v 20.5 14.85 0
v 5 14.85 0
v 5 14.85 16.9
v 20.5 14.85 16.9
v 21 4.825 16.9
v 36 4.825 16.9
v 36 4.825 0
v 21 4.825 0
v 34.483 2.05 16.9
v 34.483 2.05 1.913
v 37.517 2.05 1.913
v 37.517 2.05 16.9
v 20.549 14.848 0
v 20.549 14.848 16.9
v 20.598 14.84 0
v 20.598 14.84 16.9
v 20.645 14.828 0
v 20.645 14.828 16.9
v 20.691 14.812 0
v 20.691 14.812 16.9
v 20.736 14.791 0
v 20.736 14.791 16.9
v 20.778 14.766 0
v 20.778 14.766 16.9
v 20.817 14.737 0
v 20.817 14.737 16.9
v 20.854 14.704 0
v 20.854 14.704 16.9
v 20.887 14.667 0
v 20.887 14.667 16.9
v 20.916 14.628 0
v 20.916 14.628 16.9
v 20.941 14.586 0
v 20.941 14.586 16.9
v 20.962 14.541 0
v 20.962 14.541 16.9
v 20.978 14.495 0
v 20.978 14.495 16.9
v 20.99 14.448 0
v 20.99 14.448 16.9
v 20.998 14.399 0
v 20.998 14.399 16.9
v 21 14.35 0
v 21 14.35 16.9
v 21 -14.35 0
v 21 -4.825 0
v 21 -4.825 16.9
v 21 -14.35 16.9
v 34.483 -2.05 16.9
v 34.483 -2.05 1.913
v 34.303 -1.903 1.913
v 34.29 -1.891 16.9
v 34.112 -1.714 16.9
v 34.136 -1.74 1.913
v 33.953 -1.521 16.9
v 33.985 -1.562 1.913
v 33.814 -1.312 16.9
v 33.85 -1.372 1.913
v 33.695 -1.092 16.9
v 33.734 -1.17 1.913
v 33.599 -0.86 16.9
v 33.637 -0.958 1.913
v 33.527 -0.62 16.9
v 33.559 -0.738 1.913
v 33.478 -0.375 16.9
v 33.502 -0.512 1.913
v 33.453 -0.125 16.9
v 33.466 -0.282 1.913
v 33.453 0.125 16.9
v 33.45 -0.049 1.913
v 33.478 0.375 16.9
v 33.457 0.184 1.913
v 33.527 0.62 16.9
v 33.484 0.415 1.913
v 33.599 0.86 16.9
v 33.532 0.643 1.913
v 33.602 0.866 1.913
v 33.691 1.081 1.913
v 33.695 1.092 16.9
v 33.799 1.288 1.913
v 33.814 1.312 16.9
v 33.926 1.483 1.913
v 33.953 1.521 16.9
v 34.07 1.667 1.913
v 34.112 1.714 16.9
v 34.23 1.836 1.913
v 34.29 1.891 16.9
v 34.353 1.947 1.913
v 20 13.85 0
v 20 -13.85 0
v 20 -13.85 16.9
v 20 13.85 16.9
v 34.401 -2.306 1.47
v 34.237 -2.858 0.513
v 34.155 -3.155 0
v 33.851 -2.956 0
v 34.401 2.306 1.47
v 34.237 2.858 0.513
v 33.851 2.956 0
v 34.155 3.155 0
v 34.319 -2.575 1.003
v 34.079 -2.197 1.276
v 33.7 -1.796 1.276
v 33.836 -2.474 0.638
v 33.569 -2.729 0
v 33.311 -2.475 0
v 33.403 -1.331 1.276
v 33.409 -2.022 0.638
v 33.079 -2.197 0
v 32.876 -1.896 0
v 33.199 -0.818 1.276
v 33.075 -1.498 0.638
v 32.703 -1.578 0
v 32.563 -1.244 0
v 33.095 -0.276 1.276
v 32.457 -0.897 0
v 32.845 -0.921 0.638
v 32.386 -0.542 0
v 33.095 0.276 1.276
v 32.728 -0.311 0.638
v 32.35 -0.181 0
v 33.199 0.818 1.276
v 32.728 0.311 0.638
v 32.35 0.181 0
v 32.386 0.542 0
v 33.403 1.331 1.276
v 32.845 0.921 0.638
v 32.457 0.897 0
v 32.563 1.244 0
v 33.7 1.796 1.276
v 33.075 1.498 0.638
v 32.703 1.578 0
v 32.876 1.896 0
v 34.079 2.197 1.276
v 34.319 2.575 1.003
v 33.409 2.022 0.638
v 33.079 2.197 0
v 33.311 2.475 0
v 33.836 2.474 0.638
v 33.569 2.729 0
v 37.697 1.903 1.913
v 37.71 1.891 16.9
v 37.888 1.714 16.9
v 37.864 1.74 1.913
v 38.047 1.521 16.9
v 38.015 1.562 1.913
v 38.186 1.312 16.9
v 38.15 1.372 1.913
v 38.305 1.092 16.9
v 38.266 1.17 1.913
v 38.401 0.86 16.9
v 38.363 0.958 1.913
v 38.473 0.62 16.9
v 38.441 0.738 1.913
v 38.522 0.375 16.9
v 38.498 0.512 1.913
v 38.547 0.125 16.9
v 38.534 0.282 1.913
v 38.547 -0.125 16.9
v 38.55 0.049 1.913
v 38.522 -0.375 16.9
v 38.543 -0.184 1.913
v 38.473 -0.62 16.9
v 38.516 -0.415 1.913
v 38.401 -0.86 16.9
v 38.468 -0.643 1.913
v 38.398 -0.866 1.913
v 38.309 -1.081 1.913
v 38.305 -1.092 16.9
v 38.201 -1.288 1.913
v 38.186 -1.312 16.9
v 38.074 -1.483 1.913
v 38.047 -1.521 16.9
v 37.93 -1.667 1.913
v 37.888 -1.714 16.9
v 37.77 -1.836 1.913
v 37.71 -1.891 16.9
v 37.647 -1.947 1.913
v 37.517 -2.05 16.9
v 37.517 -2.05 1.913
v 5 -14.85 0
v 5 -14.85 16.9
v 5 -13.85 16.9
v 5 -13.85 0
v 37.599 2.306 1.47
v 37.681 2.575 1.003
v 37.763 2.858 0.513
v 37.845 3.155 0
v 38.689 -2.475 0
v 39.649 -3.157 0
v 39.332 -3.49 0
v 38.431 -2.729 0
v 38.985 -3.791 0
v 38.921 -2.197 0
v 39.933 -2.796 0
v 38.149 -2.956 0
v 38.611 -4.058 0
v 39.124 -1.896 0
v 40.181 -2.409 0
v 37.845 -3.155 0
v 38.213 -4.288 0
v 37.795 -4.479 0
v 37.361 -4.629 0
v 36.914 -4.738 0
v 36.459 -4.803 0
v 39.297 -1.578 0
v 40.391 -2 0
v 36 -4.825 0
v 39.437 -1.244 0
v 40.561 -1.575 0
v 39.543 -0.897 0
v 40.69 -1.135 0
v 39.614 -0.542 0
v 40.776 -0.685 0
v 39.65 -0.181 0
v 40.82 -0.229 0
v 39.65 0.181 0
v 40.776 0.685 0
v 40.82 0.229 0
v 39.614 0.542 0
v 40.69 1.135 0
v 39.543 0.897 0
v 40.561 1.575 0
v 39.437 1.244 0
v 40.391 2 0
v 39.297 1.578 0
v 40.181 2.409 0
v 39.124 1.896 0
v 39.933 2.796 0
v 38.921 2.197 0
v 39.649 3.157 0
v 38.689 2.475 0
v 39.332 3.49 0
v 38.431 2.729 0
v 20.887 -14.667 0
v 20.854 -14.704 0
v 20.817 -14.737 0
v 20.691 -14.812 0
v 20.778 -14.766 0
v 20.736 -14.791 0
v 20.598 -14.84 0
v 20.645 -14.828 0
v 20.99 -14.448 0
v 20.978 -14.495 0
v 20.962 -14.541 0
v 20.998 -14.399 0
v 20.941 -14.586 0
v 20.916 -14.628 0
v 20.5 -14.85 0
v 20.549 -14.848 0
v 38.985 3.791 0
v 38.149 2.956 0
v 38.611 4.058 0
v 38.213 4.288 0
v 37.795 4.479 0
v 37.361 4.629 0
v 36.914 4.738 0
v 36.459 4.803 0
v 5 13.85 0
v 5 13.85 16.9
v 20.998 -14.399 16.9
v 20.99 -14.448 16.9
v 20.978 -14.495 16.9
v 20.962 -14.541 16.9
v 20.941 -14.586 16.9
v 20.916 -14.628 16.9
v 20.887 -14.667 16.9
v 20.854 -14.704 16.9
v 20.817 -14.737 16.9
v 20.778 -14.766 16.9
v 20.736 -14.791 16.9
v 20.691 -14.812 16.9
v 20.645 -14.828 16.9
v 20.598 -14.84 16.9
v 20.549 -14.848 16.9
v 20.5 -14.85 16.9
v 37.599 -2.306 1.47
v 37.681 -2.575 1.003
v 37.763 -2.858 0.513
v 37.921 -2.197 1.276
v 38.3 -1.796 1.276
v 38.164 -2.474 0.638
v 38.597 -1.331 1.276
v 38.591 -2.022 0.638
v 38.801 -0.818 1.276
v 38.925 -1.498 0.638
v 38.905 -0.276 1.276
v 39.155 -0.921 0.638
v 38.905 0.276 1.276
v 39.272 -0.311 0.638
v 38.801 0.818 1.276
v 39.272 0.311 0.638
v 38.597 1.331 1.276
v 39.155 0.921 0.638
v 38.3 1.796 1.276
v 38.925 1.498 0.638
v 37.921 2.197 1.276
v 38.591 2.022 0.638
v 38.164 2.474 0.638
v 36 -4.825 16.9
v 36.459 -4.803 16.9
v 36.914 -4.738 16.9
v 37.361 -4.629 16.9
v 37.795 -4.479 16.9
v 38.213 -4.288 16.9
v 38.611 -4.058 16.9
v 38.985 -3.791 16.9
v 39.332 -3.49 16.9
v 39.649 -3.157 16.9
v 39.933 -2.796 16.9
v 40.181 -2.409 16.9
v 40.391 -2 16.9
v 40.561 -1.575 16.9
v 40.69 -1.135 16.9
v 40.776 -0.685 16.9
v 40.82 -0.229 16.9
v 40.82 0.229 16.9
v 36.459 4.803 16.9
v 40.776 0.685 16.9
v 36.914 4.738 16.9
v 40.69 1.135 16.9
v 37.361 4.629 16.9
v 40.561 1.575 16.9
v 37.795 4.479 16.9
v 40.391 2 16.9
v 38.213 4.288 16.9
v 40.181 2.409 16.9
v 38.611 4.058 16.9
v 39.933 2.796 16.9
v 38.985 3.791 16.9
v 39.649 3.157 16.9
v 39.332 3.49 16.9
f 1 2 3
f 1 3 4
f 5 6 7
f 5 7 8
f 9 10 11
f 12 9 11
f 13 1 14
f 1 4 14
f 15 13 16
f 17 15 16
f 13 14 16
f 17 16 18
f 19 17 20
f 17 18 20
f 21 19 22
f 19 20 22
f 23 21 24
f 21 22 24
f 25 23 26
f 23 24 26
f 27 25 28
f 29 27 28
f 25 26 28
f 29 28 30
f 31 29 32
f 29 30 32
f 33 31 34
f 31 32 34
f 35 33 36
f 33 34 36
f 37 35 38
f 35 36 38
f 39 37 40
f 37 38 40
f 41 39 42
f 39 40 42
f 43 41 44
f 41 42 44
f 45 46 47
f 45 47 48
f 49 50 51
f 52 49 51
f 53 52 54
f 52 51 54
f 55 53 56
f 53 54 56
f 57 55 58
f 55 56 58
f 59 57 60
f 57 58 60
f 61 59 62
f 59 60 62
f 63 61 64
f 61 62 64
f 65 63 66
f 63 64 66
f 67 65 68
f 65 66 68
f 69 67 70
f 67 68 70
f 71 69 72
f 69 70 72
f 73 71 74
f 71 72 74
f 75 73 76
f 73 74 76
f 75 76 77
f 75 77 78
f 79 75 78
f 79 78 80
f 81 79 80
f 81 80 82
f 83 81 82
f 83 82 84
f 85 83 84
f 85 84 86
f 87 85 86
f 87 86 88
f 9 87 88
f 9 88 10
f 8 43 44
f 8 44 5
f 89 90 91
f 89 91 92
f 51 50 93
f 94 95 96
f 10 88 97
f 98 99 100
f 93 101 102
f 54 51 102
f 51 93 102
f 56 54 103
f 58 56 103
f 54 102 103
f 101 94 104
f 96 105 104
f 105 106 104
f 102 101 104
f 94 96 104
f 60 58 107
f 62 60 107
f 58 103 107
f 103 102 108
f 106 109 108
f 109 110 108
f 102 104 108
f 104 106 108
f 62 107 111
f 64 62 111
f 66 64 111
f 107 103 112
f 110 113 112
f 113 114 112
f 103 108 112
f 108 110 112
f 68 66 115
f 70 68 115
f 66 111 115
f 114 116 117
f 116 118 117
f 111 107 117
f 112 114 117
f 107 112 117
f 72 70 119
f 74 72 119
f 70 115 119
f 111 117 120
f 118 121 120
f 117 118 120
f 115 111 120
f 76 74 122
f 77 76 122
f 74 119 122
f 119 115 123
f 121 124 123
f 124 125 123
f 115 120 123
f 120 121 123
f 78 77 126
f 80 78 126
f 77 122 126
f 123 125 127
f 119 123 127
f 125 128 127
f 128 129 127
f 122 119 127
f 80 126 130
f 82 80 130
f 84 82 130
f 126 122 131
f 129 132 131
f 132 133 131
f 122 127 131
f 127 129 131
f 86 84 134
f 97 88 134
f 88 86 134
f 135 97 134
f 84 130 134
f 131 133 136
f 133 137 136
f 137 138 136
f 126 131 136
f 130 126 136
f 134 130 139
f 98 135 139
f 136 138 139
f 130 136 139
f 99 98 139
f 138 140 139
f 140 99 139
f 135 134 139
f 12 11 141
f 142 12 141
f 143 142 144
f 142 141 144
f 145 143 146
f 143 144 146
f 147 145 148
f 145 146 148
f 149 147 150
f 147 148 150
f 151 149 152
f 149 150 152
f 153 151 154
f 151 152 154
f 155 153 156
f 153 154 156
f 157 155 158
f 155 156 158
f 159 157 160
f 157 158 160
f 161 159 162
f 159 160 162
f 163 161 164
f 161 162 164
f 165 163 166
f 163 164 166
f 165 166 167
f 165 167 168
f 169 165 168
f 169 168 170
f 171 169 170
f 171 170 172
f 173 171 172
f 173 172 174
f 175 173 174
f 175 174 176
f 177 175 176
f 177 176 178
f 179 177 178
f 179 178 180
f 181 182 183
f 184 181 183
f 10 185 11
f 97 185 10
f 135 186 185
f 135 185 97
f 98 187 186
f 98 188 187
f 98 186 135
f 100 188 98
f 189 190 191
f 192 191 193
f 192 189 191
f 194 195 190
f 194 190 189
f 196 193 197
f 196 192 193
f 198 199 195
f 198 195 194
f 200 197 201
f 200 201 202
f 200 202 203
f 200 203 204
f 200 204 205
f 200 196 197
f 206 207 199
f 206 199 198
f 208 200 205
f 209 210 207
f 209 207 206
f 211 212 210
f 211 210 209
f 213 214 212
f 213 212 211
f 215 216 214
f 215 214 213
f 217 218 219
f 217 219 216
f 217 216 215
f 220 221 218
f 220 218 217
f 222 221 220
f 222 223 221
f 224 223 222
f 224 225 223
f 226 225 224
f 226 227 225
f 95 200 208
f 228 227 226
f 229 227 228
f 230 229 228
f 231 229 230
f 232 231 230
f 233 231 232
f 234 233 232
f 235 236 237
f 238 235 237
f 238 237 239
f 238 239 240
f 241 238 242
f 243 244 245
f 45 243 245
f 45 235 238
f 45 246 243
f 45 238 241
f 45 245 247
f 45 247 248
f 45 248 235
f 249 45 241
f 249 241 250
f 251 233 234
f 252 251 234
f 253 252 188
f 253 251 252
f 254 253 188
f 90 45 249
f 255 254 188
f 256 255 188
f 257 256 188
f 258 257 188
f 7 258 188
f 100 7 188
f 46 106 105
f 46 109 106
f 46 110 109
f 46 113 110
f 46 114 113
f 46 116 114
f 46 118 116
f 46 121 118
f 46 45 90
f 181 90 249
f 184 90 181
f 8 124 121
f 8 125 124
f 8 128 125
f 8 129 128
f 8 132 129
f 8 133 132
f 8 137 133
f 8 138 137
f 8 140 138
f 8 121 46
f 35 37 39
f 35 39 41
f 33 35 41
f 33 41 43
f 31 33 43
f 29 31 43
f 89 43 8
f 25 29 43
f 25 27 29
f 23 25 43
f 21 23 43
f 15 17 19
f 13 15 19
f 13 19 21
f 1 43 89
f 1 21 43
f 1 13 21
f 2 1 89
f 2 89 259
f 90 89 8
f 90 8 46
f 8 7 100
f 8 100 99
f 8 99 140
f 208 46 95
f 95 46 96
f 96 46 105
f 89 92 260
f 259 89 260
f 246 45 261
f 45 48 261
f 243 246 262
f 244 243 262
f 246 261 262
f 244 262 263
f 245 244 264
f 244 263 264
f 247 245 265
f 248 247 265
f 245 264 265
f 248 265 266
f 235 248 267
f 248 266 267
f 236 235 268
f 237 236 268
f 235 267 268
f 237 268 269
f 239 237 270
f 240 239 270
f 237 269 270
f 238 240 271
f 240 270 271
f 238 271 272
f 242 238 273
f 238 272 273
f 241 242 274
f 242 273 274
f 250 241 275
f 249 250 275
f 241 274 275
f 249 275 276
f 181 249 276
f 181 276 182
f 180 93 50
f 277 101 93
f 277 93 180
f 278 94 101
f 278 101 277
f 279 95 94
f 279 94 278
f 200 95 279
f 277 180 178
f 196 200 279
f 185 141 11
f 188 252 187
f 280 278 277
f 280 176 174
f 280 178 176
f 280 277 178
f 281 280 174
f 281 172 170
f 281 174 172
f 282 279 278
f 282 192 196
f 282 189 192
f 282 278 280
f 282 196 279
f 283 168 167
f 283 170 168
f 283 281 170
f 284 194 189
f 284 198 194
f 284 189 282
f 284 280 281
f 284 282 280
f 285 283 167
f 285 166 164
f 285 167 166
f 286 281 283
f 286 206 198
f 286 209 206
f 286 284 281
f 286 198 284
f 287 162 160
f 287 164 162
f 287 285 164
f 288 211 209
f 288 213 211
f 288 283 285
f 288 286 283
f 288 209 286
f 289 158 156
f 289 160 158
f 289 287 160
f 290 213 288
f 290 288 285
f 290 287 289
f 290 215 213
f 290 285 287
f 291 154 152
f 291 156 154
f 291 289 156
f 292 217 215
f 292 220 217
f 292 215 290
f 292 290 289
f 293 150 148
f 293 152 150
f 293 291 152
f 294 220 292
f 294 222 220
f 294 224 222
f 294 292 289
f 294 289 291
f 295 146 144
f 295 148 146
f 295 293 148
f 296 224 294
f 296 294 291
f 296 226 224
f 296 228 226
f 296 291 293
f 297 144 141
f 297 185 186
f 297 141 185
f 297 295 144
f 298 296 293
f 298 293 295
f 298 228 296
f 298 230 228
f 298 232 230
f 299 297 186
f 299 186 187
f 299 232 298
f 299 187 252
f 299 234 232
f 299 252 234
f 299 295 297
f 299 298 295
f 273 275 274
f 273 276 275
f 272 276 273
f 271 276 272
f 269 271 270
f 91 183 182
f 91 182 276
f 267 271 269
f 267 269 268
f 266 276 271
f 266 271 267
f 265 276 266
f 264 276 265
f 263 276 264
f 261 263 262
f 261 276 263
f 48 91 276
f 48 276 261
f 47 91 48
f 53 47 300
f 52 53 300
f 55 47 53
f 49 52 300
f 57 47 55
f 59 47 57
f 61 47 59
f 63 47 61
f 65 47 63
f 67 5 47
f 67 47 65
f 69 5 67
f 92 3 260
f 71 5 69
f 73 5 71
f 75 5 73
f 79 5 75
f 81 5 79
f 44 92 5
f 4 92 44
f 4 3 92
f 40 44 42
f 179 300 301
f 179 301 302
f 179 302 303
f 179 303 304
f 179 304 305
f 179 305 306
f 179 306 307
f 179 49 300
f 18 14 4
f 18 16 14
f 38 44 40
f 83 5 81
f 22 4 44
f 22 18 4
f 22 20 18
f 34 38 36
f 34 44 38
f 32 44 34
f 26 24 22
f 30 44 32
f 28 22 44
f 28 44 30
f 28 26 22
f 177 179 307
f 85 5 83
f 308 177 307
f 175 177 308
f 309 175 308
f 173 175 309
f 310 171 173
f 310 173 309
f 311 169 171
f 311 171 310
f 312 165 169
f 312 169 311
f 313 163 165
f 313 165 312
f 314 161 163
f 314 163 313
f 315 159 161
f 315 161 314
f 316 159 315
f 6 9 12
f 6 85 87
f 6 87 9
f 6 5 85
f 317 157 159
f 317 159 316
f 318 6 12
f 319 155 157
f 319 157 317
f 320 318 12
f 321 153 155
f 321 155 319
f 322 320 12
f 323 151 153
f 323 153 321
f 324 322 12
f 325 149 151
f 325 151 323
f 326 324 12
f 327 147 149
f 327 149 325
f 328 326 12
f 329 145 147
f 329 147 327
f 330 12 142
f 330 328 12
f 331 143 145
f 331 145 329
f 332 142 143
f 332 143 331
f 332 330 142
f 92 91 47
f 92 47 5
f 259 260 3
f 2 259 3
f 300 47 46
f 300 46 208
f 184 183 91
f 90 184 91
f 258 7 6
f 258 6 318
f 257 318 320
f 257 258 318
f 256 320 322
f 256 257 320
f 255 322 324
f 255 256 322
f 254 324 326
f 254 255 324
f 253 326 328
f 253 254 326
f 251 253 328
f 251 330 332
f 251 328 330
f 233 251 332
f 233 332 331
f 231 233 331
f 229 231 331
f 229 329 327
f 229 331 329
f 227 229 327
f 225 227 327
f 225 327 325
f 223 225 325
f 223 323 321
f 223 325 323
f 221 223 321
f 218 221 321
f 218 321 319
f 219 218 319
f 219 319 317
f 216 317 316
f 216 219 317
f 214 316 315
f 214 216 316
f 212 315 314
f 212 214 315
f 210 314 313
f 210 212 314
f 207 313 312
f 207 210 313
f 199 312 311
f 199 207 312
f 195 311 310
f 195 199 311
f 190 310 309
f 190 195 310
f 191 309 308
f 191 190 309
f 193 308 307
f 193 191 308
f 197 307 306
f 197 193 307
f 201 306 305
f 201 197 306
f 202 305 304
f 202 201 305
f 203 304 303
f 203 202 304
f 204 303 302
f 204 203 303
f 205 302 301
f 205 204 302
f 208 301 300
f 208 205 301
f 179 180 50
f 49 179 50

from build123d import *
from OCP.BRepFilletAPI import BRepFilletAPI_MakeChamfer

# Parameters (mm, degrees)
BOSS_EXTRUDE1_DEPTH = 16.9
BOSS_EXTRUDE2_DEPTH = 13.5
BOSS_EXTRUDE3_DEPTH = 3.4
BOSS_EXTRUDE4_DEPTH = 13.5
CUT_EXTRUDE1_DEPTH  = 46.491242289
CHAMFER1_SIZE       = 2
CHAMFER1_SIZE2      = 1.154700538
CUT_EXTRUDE2_DEPTH  = 47.613443608
FILLET1_R           = 0.5
SKETCH10_W          = 25
SKETCH10_H          = 29.7
CUT_EXTRUDE3_DEPTH  = 47.613443644


with BuildPart() as part:
    # Sketch1 → Boss-Extrude1 (new body)
    with BuildSketch(Plane.XY):
        Polygon((-20, -13.85), (20, -13.85), (20, 13.85), (-20, 13.85), (-20, 14.85), (21, 14.85), (21, -14.85), (-20, -14.85), align=None)
    extrude(amount=BOSS_EXTRUDE1_DEPTH)

    # Sketch4 → Boss-Extrude2 (add)
    with BuildSketch(Plane(origin=(0, 0, 0), x_dir=(-1, 0, 0), z_dir=(0, 0, -1))):
        with BuildLine():
            Line((-21, 4.825), (-36, 4.825))
            ThreePointArc((-36, 4.825), (-38.610615349, 4.05774722), (-40.390970849, 2))
            Line((-40.390970849, 2), (-30.875, 2))
            Line((-30.875, 2), (-30.875, -2))
            Line((-30.875, -2), (-40.390970849, -2))
            ThreePointArc((-40.390970849, -2), (-38.610615349, -4.05774722), (-36, -4.825))
            Line((-36, -4.825), (-21, -4.825))
            Line((-21, -4.825), (-21, 4.825))
        make_face()
    extrude(amount=-BOSS_EXTRUDE2_DEPTH)

    # Sketch5 → Boss-Extrude3 (add)
    with BuildSketch(Plane.XY.offset(13.5)):
        with BuildLine():
            Line((21, 4.825), (21, -4.825))
            Line((21, -4.825), (36, -4.825))
            ThreePointArc((36, -4.825), (38.610615349, -4.05774722), (40.390970849, -2))
            ThreePointArc((40.390970849, -2), (40.825, 0), (40.390970849, 2))
            ThreePointArc((40.390970849, 2), (38.610615349, 4.05774722), (36, 4.825))
            Line((36, 4.825), (21, 4.825))
        make_face()
    extrude(amount=BOSS_EXTRUDE3_DEPTH)

    # Sketch8 → Boss-Extrude4 (add)
    with BuildSketch(Plane(origin=(0, 0, 0), x_dir=(-1, 0, 0), z_dir=(0, 0, -1))):
        with BuildLine():
            Line((-37.5, 2), (-40.390970849, 2))
            ThreePointArc((-40.390970849, 2), (-40.825, 0), (-40.390970849, -2))
            Line((-40.390970849, -2), (-37.5, -2))
            ThreePointArc((-37.5, -2), (-38.5, 0), (-37.5, 2))
        make_face()
        with BuildLine():
            Line((-34.5, 2), (-30.875, 2))
            Line((-30.875, 2), (-30.875, -2))
            Line((-30.875, -2), (-34.5, -2))
            ThreePointArc((-34.5, -2), (-33.5, 0), (-34.5, 2))
        make_face()
    extrude(amount=-BOSS_EXTRUDE4_DEPTH)

    # Sketch9 → Cut-Extrude1 (cut, through all)
    with BuildSketch(Plane(origin=(0, 0, 13.5), x_dir=(-1, 0, 0), z_dir=(0, 0, -1))):
        with BuildLine():
            Line((-37.5, -2), (-34.5, -2))
            ThreePointArc((-34.5, -2), (-33.5, 0), (-34.5, 2))
            Line((-34.5, 2), (-37.5, 2))
            ThreePointArc((-37.5, 2), (-38.5, 0), (-37.5, -2))
        make_face()
    extrude(amount=-CUT_EXTRUDE1_DEPTH, mode=Mode.SUBTRACT)

    # Chamfer1: one chamfer whose edges measure the first distance from different faces: ONE call of the kernel's chamfer builder (chamfer() names one face for all edges)
    chamfer1_edges_1 = [part.edges().sort_by_distance(p)[0] for p in [
        (36, 2, 0),
    ]]
    chamfer1_side_1 = [part.faces().sort_by_distance(p)[0] for p in [
        (36, 2, 8.45),
    ]]
    chamfer1_edges_2 = [part.edges().sort_by_distance(p)[0] for p in [
        (38.5, 0, 0),
    ]]
    chamfer1_side_2 = [part.faces().sort_by_distance(p)[0] for p in [
        (38.5, 0, 8.45),
    ]]
    chamfer1_edges_3 = [part.edges().sort_by_distance(p)[0] for p in [
        (36, -2, 0),
    ]]
    chamfer1_side_3 = [part.faces().sort_by_distance(p)[0] for p in [
        (36, -2, 8.45),
    ]]
    chamfer1_edges_4 = [part.edges().sort_by_distance(p)[0] for p in [
        (33.5, 0, 0),
    ]]
    chamfer1_side_4 = [part.faces().sort_by_distance(p)[0] for p in [
        (33.5, 0, 8.45),
    ]]
    chamfer1 = BRepFilletAPI_MakeChamfer(part.part.solid().wrapped)
    for e in chamfer1_edges_1:
        chamfer1.Add(CHAMFER1_SIZE, CHAMFER1_SIZE2, e.wrapped, chamfer1_side_1[0].wrapped)  # the first distance lies on this face
    for e in chamfer1_edges_2:
        chamfer1.Add(CHAMFER1_SIZE, CHAMFER1_SIZE2, e.wrapped, chamfer1_side_2[0].wrapped)  # the first distance lies on this face
    for e in chamfer1_edges_3:
        chamfer1.Add(CHAMFER1_SIZE, CHAMFER1_SIZE2, e.wrapped, chamfer1_side_3[0].wrapped)  # the first distance lies on this face
    for e in chamfer1_edges_4:
        chamfer1.Add(CHAMFER1_SIZE, CHAMFER1_SIZE2, e.wrapped, chamfer1_side_4[0].wrapped)  # the first distance lies on this face
    add(Compound.cast(chamfer1.Shape()), mode=Mode.REPLACE)

    # Sketch11 → Cut-Extrude2 (cut, through all)
    with BuildSketch(Plane(origin=(0, 0, 0), x_dir=(-1, 0, 0), z_dir=(0, 0, -1))):
        with BuildLine():
            Line((-34.483424911, 2.05), (-37.516575089, 2.05))
            ThreePointArc((-37.516575089, 2.05), (-38.55, 0), (-37.516575089, -2.05))
            Line((-37.516575089, -2.05), (-34.483424911, -2.05))
            ThreePointArc((-34.483424911, -2.05), (-33.45, 0), (-34.483424911, 2.05))
        make_face()
    extrude(amount=-CUT_EXTRUDE2_DEPTH, mode=Mode.SUBTRACT)

    # Fillet1
    fillet1_edges = [part.edges().sort_by_distance(p)[0] for p in [
        (-20, 14.85, 8.45),
        (21, 14.85, 8.45),
        (21, -14.85, 8.45),
        (-20, -14.85, 8.45),
    ]]
    fillet(fillet1_edges, radius=FILLET1_R)

    # Sketch10 → Cut-Extrude3 (cut, through all)
    with BuildSketch(Plane(origin=(0, 0, 0), x_dir=(-1, 0, 0), z_dir=(0, 0, -1))):
        with Locations((7.5, 0)):
            Rectangle(SKETCH10_W, SKETCH10_H)
    extrude(amount=-CUT_EXTRUDE3_DEPTH, mode=Mode.SUBTRACT)


solid = part.part
